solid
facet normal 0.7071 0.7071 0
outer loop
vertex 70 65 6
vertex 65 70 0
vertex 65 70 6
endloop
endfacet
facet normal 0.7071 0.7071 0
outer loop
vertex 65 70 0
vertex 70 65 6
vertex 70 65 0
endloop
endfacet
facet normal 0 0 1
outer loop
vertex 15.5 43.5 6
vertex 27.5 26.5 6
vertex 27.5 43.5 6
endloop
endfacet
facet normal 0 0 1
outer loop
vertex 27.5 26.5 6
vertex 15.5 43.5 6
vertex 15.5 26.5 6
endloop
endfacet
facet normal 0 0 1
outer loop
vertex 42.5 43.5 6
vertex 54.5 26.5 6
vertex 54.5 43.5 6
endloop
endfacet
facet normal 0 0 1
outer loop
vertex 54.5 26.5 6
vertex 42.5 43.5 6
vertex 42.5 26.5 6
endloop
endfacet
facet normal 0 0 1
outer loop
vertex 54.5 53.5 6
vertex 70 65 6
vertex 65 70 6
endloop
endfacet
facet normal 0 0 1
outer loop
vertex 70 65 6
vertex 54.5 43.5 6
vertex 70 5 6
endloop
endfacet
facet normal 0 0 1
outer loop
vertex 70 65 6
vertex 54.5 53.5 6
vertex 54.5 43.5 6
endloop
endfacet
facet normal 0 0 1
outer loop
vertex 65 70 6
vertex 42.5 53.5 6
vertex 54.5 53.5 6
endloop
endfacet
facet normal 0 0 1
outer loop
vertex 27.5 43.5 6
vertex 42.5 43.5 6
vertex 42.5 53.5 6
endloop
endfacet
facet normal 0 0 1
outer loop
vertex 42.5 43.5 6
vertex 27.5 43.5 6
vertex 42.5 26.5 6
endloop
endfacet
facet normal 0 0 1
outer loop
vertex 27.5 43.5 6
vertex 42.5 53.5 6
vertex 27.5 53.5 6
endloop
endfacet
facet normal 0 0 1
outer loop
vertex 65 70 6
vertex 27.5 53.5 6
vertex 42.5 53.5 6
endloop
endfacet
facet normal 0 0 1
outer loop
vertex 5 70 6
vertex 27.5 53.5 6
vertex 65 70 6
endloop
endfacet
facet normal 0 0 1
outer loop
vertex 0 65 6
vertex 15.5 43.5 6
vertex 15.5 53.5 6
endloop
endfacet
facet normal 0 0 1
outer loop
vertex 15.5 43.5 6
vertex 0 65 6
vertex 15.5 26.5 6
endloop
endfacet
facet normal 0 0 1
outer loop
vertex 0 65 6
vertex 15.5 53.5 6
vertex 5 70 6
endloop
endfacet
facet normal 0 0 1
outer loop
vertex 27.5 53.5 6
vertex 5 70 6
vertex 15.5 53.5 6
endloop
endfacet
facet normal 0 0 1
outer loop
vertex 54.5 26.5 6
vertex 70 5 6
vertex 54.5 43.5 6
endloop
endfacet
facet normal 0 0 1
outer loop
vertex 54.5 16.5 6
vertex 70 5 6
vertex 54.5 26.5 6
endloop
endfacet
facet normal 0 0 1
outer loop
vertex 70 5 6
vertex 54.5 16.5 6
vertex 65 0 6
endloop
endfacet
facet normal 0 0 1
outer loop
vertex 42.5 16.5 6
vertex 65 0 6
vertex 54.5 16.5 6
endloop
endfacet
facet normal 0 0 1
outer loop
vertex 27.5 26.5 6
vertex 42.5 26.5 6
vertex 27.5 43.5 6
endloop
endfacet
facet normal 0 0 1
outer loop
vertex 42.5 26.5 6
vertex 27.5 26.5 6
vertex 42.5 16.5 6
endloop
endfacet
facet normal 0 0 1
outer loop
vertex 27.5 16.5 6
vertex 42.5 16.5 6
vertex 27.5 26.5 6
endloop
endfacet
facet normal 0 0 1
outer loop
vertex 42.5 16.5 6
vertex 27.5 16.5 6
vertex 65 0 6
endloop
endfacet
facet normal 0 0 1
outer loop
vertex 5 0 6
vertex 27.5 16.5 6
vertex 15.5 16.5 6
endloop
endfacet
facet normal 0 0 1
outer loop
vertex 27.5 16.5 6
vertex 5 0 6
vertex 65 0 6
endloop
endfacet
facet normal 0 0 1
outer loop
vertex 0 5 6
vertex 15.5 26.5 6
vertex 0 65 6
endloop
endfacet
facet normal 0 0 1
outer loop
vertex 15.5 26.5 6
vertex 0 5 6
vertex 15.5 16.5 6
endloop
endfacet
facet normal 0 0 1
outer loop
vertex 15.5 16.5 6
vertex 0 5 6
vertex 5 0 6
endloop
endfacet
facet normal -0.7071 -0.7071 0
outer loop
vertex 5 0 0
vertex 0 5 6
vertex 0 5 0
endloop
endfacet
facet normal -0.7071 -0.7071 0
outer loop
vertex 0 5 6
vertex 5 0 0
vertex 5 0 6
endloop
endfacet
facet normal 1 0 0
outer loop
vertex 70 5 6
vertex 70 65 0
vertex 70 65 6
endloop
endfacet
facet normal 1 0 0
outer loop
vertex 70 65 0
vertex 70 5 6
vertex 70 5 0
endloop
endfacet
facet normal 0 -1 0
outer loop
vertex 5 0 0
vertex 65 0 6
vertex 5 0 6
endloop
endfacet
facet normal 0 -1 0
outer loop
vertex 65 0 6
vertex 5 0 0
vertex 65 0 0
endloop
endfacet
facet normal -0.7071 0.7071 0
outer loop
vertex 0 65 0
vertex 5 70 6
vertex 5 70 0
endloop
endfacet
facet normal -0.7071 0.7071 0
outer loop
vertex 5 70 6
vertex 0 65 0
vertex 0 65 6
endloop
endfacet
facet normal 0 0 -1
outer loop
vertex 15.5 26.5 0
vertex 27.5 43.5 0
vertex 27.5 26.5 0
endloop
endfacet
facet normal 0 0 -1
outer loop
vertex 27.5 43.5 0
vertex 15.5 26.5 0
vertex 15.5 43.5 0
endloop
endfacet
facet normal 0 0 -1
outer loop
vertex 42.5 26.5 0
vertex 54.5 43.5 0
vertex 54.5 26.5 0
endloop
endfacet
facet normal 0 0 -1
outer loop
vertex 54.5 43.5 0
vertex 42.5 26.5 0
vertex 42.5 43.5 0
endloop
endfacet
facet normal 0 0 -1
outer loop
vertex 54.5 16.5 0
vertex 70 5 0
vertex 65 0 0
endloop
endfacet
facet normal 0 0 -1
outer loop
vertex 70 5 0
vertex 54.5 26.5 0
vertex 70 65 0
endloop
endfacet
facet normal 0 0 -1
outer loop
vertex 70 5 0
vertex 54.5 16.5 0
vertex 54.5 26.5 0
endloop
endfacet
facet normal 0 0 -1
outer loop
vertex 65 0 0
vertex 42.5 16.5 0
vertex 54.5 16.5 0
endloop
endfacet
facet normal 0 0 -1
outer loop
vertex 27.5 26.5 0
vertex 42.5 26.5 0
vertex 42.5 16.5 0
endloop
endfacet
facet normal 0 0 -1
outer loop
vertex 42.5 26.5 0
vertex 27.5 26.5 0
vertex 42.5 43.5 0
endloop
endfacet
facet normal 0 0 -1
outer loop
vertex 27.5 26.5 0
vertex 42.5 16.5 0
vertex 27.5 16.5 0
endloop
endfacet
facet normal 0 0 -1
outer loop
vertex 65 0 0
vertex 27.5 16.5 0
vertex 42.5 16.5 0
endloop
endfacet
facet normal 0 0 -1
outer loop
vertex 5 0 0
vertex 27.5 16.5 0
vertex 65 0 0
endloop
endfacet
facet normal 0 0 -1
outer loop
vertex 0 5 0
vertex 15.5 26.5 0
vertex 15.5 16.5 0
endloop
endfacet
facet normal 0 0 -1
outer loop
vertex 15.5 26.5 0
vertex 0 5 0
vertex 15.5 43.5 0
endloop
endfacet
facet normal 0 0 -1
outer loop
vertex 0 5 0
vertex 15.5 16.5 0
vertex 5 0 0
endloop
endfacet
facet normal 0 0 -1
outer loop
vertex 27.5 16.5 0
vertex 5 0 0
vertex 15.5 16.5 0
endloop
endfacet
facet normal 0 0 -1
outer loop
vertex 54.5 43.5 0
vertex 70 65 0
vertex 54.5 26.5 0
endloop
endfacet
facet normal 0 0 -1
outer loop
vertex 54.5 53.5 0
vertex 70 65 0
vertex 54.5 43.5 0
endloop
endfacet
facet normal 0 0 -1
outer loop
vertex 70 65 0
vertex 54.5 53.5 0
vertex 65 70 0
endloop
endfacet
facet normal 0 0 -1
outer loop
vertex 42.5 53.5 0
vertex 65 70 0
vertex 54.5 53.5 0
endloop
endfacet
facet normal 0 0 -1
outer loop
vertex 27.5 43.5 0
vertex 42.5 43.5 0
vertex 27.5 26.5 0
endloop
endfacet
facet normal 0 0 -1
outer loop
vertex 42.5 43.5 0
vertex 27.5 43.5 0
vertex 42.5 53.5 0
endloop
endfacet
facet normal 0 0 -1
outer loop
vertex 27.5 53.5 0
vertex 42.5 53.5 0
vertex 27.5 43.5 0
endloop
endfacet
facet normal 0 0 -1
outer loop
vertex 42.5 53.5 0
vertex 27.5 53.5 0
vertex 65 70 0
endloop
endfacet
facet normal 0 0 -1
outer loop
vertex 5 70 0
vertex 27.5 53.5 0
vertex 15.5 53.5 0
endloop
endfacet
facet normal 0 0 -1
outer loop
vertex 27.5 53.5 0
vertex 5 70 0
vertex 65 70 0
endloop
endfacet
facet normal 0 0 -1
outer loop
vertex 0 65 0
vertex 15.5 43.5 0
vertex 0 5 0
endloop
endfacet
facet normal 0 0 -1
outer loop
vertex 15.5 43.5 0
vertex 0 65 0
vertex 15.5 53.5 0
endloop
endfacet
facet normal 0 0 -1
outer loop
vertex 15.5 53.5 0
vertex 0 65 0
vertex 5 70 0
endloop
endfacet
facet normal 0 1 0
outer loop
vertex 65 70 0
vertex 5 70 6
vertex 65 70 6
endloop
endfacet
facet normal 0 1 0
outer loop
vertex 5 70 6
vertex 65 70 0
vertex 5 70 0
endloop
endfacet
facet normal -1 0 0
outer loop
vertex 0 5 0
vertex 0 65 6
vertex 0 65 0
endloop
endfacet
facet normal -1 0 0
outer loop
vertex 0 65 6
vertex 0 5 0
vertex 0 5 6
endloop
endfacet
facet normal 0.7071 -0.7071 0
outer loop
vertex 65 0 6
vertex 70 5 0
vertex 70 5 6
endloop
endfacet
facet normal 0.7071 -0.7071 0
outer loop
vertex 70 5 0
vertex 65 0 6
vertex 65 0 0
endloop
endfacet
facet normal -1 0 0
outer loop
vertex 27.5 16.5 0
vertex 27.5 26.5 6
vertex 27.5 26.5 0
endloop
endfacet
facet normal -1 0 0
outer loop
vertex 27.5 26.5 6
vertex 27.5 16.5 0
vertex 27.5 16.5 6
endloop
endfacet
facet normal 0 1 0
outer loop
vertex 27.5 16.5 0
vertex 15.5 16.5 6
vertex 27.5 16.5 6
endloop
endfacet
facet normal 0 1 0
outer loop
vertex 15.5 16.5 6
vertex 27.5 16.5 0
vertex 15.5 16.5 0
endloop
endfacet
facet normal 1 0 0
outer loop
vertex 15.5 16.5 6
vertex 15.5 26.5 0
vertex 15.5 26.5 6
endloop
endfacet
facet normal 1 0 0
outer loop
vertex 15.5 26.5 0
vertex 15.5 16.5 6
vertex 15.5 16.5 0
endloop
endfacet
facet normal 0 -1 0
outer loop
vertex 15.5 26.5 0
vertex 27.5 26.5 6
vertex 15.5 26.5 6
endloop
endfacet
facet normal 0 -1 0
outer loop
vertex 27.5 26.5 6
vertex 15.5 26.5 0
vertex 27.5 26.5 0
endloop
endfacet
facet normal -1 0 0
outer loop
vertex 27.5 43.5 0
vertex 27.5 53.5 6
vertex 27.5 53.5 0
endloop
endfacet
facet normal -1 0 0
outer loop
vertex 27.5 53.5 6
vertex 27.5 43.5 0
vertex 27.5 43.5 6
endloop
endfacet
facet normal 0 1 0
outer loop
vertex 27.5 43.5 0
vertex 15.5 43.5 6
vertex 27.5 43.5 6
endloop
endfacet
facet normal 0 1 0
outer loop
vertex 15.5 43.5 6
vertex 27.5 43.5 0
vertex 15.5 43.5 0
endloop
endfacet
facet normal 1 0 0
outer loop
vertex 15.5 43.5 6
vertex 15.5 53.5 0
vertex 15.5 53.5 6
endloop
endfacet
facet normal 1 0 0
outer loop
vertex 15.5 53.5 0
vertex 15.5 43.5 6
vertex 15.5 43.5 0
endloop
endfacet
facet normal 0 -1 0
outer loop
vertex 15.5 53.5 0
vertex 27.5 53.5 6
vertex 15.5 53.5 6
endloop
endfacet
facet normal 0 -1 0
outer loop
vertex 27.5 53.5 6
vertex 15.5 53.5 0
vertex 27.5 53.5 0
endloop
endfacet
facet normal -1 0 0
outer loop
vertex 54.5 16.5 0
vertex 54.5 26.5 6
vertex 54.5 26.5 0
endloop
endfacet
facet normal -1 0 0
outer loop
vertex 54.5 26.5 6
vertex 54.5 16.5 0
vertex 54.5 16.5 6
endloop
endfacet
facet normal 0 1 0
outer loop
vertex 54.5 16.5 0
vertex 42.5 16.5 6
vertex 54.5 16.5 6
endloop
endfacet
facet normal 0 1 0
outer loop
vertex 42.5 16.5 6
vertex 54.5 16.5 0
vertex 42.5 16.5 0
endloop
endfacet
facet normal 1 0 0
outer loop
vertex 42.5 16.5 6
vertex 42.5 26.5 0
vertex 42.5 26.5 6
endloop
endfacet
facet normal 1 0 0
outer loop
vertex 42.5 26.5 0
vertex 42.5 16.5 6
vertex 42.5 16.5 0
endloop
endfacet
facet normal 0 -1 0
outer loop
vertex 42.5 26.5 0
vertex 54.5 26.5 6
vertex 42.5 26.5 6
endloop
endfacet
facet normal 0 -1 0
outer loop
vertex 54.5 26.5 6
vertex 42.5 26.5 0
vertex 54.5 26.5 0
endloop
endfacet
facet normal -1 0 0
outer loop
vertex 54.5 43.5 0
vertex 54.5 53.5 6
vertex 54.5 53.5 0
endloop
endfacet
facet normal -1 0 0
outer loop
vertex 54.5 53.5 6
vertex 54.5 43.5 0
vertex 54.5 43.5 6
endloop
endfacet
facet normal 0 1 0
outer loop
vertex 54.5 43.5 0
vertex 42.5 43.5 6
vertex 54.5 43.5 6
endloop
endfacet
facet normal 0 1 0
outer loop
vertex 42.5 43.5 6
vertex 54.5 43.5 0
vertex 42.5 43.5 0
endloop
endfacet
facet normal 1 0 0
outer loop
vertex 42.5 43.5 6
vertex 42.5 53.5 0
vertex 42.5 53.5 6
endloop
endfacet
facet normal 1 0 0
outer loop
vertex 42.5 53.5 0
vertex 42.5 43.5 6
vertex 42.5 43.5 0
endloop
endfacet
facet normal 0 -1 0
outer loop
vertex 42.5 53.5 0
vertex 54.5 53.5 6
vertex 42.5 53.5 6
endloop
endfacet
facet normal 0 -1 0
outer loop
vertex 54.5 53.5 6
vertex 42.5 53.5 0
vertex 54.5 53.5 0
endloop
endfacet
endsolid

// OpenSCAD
$fn = 32;

// ----------------------------------------------------------------------
// Windowed plate: 4 voids, 70 x 70 x 6 mm
// ----------------------------------------------------------------------

// --- parameters (mm) ---
plate_l = 70;             // plate length, X
plate_w = 70;             // plate width, Y
plate_t = 6;              // plate thickness, Z
edge_margin = 8;          // wall from the plate edge to any window
win_l = 12;               // pocket length
win_w = 10;               // pocket width
pitch_x = 27;             // grid pitch along X
pitch_y = 27;             // grid pitch along Y
depth_1 = 6;              // depth of void 1 (full thickness = through)
depth_2 = 6;              // depth of void 2 (full thickness = through)
depth_3 = 6;              // depth of void 3 (full thickness = through)
depth_4 = 6;              // depth of void 4 (full thickness = through)
corner_c = 5;             // corner chamfer of the plate

profile = [[5, 0], [65, 0], [70, 5], [70, 65], [65, 70], [5, 70], [0, 65], [0, 5]];  // primary outline, 8 points, counter clockwise
void_1 = [[15.5, 16.5], [27.5, 16.5], [27.5, 26.5], [15.5, 26.5]];  // pocket at grid node 0,0, 4 points
void_2 = [[15.5, 43.5], [27.5, 43.5], [27.5, 53.5], [15.5, 53.5]];  // pocket at grid node 0,1, 4 points
void_3 = [[42.5, 16.5], [54.5, 16.5], [54.5, 26.5], [42.5, 26.5]];  // pocket at grid node 1,0, 4 points
void_4 = [[42.5, 43.5], [54.5, 43.5], [54.5, 53.5], [42.5, 53.5]];  // pocket at grid node 1,1, 4 points

// --- the one profile operation ---
difference() {
  linear_extrude(height = plate_t) polygon(points = profile);
  translate([0, 0, -1])
    linear_extrude(height = plate_t + 2) polygon(points = void_1);
  translate([0, 0, -1])
    linear_extrude(height = plate_t + 2) polygon(points = void_2);
  translate([0, 0, -1])
    linear_extrude(height = plate_t + 2) polygon(points = void_3);
  translate([0, 0, -1])
    linear_extrude(height = plate_t + 2) polygon(points = void_4);
}
